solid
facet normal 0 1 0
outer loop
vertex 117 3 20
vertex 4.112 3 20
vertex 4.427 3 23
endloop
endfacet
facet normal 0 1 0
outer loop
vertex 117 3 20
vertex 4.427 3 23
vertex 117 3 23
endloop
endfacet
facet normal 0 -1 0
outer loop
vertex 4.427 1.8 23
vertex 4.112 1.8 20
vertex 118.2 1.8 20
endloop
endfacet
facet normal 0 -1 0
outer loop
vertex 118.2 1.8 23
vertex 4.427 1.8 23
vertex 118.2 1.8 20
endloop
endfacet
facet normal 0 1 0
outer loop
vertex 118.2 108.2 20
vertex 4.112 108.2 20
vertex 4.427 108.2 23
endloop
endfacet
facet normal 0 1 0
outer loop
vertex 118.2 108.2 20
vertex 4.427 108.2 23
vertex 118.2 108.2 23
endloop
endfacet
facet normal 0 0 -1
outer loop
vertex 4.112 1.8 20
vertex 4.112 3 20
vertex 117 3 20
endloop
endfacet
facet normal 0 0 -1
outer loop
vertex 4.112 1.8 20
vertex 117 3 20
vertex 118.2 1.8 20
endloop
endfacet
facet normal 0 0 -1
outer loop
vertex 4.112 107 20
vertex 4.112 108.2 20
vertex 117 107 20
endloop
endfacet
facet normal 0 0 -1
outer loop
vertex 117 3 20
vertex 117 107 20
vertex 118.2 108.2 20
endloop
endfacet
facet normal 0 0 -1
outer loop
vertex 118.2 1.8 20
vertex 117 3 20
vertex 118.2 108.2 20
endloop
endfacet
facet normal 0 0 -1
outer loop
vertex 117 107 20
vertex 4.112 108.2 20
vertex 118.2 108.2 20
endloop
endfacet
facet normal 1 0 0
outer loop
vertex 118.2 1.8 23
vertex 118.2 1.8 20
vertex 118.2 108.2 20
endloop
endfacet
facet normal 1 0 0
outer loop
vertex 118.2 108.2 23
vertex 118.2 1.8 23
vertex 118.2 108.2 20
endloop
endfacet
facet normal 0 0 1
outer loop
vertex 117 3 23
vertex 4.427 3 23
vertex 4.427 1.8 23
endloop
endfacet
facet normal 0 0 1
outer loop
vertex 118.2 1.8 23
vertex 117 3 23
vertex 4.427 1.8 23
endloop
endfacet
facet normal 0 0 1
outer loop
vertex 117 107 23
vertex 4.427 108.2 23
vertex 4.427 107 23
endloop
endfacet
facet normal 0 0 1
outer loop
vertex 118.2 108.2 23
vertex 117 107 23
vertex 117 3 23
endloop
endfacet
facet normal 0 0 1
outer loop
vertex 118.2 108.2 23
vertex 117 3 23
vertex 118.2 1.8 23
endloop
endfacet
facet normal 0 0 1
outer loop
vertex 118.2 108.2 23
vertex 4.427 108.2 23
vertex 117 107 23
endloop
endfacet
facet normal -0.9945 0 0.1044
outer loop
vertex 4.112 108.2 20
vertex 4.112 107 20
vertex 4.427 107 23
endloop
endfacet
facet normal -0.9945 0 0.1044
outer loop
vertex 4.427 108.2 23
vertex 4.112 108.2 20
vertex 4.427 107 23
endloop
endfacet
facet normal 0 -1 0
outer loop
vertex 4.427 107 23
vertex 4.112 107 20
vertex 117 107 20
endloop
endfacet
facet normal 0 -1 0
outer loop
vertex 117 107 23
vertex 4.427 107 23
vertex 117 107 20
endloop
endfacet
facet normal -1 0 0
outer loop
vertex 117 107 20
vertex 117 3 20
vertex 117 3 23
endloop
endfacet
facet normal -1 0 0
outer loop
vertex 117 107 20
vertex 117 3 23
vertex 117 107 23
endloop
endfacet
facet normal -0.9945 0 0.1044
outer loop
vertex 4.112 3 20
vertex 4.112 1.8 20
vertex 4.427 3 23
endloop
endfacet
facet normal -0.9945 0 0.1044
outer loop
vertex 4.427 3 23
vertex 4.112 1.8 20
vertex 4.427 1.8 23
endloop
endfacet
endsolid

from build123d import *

# Parameters (mm, degrees)
PAD005_DEPTH = 110
BOX049_W     = 117
BOX049_H     = 104
BOX049_DEPTH = 3
BOX048_W     = 118.2
BOX048_H     = 106.4
BOX048_DEPTH = 3


with BuildPart() as pad_rahmen:
    # Sketch010 → Pad005 (new body)
    with BuildSketch(Plane.XZ):
        Polygon((0, 0), (2.01, 0), (6.250278, 40.343548), (0, 40.343548), align=None)
    extrude(amount=-PAD005_DEPTH)


with BuildPart() as cube041:
    # Box049 → Box049 (new body)
    with BuildSketch(Plane(origin=(0, 1.2, 0), x_dir=(1, 0, 0), z_dir=(0, 0, 1))):
        with Locations((58.5, 52)):
            Rectangle(BOX049_W, BOX049_H)
    extrude(amount=BOX049_DEPTH)


with BuildPart() as rahmen_cut:
    # Box048 → Box048 (new body)
    with BuildSketch(Plane.XY):
        with Locations((59.1, 53.2)):
            Rectangle(BOX048_W, BOX048_H)
    extrude(amount=BOX048_DEPTH)

    # Cut048: cut Cube041
    add(cube041.part, mode=Mode.SUBTRACT)


with BuildPart() as rahmen_cut_1:
    # Cut048 placement: moved
    add(rahmen_cut.part.moved(Location((0, 1.8, 20))))

    # Cut049: cut Pad_Rahmen
    add(pad_rahmen.part, mode=Mode.SUBTRACT)


solid = rahmen_cut_1.part
